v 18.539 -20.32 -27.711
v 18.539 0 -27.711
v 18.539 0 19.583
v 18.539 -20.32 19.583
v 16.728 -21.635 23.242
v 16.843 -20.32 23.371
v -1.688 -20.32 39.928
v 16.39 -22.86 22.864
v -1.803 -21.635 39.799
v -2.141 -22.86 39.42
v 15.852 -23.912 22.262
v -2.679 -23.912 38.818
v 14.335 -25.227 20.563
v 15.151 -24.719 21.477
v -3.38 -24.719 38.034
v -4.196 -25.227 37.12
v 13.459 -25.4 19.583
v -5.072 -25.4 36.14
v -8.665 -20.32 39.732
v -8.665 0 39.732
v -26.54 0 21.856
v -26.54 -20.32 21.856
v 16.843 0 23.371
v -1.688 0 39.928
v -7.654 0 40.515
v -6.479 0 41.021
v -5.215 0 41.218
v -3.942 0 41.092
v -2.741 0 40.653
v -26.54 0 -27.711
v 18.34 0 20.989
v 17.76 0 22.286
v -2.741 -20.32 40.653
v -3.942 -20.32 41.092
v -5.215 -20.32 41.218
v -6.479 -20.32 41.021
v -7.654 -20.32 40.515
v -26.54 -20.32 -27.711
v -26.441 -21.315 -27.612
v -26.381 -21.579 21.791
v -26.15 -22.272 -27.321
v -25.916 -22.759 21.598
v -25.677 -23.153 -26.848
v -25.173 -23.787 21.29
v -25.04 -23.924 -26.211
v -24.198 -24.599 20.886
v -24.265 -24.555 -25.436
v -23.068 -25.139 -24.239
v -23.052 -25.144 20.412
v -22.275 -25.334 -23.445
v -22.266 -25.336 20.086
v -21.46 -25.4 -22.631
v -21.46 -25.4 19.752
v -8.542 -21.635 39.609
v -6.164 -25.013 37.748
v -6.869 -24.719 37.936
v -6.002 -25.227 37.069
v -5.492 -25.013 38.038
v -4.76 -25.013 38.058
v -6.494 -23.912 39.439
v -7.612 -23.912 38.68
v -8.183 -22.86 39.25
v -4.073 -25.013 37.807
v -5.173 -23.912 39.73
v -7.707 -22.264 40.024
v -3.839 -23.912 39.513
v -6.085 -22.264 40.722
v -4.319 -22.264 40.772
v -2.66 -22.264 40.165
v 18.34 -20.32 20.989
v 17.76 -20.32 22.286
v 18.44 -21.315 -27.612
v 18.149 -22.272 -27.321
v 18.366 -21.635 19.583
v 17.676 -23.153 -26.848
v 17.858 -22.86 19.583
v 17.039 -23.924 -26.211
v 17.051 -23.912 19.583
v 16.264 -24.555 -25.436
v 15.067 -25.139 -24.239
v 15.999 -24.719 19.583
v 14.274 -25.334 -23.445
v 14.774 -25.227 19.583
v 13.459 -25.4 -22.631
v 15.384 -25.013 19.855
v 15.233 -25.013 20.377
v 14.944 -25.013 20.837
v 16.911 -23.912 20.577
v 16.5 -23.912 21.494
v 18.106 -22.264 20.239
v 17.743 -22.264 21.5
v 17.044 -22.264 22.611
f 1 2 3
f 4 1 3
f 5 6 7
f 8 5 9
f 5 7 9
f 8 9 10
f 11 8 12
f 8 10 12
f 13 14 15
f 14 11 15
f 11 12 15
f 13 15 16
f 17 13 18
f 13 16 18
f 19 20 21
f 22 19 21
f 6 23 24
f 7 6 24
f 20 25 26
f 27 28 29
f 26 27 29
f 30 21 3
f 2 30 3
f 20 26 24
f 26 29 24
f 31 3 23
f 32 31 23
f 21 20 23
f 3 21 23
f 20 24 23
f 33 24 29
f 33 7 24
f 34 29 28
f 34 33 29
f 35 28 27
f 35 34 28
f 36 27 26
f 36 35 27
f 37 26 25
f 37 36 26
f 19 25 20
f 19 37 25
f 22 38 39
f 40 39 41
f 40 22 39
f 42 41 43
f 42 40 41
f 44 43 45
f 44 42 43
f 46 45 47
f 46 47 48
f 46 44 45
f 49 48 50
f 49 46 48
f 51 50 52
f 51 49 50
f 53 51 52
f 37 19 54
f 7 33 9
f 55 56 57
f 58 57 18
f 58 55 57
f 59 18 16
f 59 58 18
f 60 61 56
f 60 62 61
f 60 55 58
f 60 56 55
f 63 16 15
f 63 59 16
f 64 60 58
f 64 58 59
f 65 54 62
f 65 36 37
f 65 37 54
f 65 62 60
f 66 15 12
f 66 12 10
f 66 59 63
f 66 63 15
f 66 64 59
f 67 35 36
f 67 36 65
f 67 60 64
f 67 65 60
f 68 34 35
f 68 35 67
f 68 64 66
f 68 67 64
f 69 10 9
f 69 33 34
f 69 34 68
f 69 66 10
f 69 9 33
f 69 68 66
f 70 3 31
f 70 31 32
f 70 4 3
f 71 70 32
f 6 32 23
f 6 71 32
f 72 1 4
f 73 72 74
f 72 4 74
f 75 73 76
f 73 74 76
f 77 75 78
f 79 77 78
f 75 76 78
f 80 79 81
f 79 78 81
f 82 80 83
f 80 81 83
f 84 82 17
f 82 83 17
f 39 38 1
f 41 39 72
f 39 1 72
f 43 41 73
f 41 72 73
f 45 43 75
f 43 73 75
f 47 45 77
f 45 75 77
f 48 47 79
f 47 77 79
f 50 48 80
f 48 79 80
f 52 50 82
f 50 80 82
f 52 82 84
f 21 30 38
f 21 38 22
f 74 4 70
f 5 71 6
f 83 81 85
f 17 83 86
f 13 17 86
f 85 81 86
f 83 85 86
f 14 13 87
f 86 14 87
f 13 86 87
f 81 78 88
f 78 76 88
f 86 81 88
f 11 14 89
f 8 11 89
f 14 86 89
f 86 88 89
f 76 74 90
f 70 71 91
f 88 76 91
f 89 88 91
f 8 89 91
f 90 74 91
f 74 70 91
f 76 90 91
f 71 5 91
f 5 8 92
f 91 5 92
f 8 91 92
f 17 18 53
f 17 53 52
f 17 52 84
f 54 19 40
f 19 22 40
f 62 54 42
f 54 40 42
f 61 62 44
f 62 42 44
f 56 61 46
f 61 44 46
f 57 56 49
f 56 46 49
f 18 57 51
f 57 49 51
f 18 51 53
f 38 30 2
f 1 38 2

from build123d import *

# Parameters (mm, degrees)
F0_W     = 45.0788065791
F0_H     = 49.5671723038
F1_DEPTH = 25.4
F3_R     = 5.08


# Not quite as in the source:
# - a feature of the source that left no trace in its solid (it failed there, or was rolled back) is left out


with BuildPart() as f1:
    # F0 (on Front) → F1 (new body)
    with BuildSketch(Plane.XZ):
        with Locations((-4.0004998446, -2.9271943495)):
            Rectangle(F0_W, F0_H)
        Polygon((-5.2689509466, 43.1273430586), (-26.5399031341, 21.8563918024), (18.538903445, 21.8563918024), align=None)
    extrude(amount=F1_DEPTH)

    # F3
    f3_edges = [f1.edges().sort_by_distance(p)[0] for p in [
        (-15.904427, -25.4, 32.491867),
        (-26.539903, -25.4, -2.927194),
        (-4.0005, -25.4, -27.710781),
        (18.538903, -25.4, -2.927194),
        (6.634976, -25.4, 32.491867),
        (18.538903, -12.7, 21.856392),
        (-5.268951, -12.7, 43.127343),
    ]]
    fillet(f3_edges, radius=F3_R)


solid = f1.part
